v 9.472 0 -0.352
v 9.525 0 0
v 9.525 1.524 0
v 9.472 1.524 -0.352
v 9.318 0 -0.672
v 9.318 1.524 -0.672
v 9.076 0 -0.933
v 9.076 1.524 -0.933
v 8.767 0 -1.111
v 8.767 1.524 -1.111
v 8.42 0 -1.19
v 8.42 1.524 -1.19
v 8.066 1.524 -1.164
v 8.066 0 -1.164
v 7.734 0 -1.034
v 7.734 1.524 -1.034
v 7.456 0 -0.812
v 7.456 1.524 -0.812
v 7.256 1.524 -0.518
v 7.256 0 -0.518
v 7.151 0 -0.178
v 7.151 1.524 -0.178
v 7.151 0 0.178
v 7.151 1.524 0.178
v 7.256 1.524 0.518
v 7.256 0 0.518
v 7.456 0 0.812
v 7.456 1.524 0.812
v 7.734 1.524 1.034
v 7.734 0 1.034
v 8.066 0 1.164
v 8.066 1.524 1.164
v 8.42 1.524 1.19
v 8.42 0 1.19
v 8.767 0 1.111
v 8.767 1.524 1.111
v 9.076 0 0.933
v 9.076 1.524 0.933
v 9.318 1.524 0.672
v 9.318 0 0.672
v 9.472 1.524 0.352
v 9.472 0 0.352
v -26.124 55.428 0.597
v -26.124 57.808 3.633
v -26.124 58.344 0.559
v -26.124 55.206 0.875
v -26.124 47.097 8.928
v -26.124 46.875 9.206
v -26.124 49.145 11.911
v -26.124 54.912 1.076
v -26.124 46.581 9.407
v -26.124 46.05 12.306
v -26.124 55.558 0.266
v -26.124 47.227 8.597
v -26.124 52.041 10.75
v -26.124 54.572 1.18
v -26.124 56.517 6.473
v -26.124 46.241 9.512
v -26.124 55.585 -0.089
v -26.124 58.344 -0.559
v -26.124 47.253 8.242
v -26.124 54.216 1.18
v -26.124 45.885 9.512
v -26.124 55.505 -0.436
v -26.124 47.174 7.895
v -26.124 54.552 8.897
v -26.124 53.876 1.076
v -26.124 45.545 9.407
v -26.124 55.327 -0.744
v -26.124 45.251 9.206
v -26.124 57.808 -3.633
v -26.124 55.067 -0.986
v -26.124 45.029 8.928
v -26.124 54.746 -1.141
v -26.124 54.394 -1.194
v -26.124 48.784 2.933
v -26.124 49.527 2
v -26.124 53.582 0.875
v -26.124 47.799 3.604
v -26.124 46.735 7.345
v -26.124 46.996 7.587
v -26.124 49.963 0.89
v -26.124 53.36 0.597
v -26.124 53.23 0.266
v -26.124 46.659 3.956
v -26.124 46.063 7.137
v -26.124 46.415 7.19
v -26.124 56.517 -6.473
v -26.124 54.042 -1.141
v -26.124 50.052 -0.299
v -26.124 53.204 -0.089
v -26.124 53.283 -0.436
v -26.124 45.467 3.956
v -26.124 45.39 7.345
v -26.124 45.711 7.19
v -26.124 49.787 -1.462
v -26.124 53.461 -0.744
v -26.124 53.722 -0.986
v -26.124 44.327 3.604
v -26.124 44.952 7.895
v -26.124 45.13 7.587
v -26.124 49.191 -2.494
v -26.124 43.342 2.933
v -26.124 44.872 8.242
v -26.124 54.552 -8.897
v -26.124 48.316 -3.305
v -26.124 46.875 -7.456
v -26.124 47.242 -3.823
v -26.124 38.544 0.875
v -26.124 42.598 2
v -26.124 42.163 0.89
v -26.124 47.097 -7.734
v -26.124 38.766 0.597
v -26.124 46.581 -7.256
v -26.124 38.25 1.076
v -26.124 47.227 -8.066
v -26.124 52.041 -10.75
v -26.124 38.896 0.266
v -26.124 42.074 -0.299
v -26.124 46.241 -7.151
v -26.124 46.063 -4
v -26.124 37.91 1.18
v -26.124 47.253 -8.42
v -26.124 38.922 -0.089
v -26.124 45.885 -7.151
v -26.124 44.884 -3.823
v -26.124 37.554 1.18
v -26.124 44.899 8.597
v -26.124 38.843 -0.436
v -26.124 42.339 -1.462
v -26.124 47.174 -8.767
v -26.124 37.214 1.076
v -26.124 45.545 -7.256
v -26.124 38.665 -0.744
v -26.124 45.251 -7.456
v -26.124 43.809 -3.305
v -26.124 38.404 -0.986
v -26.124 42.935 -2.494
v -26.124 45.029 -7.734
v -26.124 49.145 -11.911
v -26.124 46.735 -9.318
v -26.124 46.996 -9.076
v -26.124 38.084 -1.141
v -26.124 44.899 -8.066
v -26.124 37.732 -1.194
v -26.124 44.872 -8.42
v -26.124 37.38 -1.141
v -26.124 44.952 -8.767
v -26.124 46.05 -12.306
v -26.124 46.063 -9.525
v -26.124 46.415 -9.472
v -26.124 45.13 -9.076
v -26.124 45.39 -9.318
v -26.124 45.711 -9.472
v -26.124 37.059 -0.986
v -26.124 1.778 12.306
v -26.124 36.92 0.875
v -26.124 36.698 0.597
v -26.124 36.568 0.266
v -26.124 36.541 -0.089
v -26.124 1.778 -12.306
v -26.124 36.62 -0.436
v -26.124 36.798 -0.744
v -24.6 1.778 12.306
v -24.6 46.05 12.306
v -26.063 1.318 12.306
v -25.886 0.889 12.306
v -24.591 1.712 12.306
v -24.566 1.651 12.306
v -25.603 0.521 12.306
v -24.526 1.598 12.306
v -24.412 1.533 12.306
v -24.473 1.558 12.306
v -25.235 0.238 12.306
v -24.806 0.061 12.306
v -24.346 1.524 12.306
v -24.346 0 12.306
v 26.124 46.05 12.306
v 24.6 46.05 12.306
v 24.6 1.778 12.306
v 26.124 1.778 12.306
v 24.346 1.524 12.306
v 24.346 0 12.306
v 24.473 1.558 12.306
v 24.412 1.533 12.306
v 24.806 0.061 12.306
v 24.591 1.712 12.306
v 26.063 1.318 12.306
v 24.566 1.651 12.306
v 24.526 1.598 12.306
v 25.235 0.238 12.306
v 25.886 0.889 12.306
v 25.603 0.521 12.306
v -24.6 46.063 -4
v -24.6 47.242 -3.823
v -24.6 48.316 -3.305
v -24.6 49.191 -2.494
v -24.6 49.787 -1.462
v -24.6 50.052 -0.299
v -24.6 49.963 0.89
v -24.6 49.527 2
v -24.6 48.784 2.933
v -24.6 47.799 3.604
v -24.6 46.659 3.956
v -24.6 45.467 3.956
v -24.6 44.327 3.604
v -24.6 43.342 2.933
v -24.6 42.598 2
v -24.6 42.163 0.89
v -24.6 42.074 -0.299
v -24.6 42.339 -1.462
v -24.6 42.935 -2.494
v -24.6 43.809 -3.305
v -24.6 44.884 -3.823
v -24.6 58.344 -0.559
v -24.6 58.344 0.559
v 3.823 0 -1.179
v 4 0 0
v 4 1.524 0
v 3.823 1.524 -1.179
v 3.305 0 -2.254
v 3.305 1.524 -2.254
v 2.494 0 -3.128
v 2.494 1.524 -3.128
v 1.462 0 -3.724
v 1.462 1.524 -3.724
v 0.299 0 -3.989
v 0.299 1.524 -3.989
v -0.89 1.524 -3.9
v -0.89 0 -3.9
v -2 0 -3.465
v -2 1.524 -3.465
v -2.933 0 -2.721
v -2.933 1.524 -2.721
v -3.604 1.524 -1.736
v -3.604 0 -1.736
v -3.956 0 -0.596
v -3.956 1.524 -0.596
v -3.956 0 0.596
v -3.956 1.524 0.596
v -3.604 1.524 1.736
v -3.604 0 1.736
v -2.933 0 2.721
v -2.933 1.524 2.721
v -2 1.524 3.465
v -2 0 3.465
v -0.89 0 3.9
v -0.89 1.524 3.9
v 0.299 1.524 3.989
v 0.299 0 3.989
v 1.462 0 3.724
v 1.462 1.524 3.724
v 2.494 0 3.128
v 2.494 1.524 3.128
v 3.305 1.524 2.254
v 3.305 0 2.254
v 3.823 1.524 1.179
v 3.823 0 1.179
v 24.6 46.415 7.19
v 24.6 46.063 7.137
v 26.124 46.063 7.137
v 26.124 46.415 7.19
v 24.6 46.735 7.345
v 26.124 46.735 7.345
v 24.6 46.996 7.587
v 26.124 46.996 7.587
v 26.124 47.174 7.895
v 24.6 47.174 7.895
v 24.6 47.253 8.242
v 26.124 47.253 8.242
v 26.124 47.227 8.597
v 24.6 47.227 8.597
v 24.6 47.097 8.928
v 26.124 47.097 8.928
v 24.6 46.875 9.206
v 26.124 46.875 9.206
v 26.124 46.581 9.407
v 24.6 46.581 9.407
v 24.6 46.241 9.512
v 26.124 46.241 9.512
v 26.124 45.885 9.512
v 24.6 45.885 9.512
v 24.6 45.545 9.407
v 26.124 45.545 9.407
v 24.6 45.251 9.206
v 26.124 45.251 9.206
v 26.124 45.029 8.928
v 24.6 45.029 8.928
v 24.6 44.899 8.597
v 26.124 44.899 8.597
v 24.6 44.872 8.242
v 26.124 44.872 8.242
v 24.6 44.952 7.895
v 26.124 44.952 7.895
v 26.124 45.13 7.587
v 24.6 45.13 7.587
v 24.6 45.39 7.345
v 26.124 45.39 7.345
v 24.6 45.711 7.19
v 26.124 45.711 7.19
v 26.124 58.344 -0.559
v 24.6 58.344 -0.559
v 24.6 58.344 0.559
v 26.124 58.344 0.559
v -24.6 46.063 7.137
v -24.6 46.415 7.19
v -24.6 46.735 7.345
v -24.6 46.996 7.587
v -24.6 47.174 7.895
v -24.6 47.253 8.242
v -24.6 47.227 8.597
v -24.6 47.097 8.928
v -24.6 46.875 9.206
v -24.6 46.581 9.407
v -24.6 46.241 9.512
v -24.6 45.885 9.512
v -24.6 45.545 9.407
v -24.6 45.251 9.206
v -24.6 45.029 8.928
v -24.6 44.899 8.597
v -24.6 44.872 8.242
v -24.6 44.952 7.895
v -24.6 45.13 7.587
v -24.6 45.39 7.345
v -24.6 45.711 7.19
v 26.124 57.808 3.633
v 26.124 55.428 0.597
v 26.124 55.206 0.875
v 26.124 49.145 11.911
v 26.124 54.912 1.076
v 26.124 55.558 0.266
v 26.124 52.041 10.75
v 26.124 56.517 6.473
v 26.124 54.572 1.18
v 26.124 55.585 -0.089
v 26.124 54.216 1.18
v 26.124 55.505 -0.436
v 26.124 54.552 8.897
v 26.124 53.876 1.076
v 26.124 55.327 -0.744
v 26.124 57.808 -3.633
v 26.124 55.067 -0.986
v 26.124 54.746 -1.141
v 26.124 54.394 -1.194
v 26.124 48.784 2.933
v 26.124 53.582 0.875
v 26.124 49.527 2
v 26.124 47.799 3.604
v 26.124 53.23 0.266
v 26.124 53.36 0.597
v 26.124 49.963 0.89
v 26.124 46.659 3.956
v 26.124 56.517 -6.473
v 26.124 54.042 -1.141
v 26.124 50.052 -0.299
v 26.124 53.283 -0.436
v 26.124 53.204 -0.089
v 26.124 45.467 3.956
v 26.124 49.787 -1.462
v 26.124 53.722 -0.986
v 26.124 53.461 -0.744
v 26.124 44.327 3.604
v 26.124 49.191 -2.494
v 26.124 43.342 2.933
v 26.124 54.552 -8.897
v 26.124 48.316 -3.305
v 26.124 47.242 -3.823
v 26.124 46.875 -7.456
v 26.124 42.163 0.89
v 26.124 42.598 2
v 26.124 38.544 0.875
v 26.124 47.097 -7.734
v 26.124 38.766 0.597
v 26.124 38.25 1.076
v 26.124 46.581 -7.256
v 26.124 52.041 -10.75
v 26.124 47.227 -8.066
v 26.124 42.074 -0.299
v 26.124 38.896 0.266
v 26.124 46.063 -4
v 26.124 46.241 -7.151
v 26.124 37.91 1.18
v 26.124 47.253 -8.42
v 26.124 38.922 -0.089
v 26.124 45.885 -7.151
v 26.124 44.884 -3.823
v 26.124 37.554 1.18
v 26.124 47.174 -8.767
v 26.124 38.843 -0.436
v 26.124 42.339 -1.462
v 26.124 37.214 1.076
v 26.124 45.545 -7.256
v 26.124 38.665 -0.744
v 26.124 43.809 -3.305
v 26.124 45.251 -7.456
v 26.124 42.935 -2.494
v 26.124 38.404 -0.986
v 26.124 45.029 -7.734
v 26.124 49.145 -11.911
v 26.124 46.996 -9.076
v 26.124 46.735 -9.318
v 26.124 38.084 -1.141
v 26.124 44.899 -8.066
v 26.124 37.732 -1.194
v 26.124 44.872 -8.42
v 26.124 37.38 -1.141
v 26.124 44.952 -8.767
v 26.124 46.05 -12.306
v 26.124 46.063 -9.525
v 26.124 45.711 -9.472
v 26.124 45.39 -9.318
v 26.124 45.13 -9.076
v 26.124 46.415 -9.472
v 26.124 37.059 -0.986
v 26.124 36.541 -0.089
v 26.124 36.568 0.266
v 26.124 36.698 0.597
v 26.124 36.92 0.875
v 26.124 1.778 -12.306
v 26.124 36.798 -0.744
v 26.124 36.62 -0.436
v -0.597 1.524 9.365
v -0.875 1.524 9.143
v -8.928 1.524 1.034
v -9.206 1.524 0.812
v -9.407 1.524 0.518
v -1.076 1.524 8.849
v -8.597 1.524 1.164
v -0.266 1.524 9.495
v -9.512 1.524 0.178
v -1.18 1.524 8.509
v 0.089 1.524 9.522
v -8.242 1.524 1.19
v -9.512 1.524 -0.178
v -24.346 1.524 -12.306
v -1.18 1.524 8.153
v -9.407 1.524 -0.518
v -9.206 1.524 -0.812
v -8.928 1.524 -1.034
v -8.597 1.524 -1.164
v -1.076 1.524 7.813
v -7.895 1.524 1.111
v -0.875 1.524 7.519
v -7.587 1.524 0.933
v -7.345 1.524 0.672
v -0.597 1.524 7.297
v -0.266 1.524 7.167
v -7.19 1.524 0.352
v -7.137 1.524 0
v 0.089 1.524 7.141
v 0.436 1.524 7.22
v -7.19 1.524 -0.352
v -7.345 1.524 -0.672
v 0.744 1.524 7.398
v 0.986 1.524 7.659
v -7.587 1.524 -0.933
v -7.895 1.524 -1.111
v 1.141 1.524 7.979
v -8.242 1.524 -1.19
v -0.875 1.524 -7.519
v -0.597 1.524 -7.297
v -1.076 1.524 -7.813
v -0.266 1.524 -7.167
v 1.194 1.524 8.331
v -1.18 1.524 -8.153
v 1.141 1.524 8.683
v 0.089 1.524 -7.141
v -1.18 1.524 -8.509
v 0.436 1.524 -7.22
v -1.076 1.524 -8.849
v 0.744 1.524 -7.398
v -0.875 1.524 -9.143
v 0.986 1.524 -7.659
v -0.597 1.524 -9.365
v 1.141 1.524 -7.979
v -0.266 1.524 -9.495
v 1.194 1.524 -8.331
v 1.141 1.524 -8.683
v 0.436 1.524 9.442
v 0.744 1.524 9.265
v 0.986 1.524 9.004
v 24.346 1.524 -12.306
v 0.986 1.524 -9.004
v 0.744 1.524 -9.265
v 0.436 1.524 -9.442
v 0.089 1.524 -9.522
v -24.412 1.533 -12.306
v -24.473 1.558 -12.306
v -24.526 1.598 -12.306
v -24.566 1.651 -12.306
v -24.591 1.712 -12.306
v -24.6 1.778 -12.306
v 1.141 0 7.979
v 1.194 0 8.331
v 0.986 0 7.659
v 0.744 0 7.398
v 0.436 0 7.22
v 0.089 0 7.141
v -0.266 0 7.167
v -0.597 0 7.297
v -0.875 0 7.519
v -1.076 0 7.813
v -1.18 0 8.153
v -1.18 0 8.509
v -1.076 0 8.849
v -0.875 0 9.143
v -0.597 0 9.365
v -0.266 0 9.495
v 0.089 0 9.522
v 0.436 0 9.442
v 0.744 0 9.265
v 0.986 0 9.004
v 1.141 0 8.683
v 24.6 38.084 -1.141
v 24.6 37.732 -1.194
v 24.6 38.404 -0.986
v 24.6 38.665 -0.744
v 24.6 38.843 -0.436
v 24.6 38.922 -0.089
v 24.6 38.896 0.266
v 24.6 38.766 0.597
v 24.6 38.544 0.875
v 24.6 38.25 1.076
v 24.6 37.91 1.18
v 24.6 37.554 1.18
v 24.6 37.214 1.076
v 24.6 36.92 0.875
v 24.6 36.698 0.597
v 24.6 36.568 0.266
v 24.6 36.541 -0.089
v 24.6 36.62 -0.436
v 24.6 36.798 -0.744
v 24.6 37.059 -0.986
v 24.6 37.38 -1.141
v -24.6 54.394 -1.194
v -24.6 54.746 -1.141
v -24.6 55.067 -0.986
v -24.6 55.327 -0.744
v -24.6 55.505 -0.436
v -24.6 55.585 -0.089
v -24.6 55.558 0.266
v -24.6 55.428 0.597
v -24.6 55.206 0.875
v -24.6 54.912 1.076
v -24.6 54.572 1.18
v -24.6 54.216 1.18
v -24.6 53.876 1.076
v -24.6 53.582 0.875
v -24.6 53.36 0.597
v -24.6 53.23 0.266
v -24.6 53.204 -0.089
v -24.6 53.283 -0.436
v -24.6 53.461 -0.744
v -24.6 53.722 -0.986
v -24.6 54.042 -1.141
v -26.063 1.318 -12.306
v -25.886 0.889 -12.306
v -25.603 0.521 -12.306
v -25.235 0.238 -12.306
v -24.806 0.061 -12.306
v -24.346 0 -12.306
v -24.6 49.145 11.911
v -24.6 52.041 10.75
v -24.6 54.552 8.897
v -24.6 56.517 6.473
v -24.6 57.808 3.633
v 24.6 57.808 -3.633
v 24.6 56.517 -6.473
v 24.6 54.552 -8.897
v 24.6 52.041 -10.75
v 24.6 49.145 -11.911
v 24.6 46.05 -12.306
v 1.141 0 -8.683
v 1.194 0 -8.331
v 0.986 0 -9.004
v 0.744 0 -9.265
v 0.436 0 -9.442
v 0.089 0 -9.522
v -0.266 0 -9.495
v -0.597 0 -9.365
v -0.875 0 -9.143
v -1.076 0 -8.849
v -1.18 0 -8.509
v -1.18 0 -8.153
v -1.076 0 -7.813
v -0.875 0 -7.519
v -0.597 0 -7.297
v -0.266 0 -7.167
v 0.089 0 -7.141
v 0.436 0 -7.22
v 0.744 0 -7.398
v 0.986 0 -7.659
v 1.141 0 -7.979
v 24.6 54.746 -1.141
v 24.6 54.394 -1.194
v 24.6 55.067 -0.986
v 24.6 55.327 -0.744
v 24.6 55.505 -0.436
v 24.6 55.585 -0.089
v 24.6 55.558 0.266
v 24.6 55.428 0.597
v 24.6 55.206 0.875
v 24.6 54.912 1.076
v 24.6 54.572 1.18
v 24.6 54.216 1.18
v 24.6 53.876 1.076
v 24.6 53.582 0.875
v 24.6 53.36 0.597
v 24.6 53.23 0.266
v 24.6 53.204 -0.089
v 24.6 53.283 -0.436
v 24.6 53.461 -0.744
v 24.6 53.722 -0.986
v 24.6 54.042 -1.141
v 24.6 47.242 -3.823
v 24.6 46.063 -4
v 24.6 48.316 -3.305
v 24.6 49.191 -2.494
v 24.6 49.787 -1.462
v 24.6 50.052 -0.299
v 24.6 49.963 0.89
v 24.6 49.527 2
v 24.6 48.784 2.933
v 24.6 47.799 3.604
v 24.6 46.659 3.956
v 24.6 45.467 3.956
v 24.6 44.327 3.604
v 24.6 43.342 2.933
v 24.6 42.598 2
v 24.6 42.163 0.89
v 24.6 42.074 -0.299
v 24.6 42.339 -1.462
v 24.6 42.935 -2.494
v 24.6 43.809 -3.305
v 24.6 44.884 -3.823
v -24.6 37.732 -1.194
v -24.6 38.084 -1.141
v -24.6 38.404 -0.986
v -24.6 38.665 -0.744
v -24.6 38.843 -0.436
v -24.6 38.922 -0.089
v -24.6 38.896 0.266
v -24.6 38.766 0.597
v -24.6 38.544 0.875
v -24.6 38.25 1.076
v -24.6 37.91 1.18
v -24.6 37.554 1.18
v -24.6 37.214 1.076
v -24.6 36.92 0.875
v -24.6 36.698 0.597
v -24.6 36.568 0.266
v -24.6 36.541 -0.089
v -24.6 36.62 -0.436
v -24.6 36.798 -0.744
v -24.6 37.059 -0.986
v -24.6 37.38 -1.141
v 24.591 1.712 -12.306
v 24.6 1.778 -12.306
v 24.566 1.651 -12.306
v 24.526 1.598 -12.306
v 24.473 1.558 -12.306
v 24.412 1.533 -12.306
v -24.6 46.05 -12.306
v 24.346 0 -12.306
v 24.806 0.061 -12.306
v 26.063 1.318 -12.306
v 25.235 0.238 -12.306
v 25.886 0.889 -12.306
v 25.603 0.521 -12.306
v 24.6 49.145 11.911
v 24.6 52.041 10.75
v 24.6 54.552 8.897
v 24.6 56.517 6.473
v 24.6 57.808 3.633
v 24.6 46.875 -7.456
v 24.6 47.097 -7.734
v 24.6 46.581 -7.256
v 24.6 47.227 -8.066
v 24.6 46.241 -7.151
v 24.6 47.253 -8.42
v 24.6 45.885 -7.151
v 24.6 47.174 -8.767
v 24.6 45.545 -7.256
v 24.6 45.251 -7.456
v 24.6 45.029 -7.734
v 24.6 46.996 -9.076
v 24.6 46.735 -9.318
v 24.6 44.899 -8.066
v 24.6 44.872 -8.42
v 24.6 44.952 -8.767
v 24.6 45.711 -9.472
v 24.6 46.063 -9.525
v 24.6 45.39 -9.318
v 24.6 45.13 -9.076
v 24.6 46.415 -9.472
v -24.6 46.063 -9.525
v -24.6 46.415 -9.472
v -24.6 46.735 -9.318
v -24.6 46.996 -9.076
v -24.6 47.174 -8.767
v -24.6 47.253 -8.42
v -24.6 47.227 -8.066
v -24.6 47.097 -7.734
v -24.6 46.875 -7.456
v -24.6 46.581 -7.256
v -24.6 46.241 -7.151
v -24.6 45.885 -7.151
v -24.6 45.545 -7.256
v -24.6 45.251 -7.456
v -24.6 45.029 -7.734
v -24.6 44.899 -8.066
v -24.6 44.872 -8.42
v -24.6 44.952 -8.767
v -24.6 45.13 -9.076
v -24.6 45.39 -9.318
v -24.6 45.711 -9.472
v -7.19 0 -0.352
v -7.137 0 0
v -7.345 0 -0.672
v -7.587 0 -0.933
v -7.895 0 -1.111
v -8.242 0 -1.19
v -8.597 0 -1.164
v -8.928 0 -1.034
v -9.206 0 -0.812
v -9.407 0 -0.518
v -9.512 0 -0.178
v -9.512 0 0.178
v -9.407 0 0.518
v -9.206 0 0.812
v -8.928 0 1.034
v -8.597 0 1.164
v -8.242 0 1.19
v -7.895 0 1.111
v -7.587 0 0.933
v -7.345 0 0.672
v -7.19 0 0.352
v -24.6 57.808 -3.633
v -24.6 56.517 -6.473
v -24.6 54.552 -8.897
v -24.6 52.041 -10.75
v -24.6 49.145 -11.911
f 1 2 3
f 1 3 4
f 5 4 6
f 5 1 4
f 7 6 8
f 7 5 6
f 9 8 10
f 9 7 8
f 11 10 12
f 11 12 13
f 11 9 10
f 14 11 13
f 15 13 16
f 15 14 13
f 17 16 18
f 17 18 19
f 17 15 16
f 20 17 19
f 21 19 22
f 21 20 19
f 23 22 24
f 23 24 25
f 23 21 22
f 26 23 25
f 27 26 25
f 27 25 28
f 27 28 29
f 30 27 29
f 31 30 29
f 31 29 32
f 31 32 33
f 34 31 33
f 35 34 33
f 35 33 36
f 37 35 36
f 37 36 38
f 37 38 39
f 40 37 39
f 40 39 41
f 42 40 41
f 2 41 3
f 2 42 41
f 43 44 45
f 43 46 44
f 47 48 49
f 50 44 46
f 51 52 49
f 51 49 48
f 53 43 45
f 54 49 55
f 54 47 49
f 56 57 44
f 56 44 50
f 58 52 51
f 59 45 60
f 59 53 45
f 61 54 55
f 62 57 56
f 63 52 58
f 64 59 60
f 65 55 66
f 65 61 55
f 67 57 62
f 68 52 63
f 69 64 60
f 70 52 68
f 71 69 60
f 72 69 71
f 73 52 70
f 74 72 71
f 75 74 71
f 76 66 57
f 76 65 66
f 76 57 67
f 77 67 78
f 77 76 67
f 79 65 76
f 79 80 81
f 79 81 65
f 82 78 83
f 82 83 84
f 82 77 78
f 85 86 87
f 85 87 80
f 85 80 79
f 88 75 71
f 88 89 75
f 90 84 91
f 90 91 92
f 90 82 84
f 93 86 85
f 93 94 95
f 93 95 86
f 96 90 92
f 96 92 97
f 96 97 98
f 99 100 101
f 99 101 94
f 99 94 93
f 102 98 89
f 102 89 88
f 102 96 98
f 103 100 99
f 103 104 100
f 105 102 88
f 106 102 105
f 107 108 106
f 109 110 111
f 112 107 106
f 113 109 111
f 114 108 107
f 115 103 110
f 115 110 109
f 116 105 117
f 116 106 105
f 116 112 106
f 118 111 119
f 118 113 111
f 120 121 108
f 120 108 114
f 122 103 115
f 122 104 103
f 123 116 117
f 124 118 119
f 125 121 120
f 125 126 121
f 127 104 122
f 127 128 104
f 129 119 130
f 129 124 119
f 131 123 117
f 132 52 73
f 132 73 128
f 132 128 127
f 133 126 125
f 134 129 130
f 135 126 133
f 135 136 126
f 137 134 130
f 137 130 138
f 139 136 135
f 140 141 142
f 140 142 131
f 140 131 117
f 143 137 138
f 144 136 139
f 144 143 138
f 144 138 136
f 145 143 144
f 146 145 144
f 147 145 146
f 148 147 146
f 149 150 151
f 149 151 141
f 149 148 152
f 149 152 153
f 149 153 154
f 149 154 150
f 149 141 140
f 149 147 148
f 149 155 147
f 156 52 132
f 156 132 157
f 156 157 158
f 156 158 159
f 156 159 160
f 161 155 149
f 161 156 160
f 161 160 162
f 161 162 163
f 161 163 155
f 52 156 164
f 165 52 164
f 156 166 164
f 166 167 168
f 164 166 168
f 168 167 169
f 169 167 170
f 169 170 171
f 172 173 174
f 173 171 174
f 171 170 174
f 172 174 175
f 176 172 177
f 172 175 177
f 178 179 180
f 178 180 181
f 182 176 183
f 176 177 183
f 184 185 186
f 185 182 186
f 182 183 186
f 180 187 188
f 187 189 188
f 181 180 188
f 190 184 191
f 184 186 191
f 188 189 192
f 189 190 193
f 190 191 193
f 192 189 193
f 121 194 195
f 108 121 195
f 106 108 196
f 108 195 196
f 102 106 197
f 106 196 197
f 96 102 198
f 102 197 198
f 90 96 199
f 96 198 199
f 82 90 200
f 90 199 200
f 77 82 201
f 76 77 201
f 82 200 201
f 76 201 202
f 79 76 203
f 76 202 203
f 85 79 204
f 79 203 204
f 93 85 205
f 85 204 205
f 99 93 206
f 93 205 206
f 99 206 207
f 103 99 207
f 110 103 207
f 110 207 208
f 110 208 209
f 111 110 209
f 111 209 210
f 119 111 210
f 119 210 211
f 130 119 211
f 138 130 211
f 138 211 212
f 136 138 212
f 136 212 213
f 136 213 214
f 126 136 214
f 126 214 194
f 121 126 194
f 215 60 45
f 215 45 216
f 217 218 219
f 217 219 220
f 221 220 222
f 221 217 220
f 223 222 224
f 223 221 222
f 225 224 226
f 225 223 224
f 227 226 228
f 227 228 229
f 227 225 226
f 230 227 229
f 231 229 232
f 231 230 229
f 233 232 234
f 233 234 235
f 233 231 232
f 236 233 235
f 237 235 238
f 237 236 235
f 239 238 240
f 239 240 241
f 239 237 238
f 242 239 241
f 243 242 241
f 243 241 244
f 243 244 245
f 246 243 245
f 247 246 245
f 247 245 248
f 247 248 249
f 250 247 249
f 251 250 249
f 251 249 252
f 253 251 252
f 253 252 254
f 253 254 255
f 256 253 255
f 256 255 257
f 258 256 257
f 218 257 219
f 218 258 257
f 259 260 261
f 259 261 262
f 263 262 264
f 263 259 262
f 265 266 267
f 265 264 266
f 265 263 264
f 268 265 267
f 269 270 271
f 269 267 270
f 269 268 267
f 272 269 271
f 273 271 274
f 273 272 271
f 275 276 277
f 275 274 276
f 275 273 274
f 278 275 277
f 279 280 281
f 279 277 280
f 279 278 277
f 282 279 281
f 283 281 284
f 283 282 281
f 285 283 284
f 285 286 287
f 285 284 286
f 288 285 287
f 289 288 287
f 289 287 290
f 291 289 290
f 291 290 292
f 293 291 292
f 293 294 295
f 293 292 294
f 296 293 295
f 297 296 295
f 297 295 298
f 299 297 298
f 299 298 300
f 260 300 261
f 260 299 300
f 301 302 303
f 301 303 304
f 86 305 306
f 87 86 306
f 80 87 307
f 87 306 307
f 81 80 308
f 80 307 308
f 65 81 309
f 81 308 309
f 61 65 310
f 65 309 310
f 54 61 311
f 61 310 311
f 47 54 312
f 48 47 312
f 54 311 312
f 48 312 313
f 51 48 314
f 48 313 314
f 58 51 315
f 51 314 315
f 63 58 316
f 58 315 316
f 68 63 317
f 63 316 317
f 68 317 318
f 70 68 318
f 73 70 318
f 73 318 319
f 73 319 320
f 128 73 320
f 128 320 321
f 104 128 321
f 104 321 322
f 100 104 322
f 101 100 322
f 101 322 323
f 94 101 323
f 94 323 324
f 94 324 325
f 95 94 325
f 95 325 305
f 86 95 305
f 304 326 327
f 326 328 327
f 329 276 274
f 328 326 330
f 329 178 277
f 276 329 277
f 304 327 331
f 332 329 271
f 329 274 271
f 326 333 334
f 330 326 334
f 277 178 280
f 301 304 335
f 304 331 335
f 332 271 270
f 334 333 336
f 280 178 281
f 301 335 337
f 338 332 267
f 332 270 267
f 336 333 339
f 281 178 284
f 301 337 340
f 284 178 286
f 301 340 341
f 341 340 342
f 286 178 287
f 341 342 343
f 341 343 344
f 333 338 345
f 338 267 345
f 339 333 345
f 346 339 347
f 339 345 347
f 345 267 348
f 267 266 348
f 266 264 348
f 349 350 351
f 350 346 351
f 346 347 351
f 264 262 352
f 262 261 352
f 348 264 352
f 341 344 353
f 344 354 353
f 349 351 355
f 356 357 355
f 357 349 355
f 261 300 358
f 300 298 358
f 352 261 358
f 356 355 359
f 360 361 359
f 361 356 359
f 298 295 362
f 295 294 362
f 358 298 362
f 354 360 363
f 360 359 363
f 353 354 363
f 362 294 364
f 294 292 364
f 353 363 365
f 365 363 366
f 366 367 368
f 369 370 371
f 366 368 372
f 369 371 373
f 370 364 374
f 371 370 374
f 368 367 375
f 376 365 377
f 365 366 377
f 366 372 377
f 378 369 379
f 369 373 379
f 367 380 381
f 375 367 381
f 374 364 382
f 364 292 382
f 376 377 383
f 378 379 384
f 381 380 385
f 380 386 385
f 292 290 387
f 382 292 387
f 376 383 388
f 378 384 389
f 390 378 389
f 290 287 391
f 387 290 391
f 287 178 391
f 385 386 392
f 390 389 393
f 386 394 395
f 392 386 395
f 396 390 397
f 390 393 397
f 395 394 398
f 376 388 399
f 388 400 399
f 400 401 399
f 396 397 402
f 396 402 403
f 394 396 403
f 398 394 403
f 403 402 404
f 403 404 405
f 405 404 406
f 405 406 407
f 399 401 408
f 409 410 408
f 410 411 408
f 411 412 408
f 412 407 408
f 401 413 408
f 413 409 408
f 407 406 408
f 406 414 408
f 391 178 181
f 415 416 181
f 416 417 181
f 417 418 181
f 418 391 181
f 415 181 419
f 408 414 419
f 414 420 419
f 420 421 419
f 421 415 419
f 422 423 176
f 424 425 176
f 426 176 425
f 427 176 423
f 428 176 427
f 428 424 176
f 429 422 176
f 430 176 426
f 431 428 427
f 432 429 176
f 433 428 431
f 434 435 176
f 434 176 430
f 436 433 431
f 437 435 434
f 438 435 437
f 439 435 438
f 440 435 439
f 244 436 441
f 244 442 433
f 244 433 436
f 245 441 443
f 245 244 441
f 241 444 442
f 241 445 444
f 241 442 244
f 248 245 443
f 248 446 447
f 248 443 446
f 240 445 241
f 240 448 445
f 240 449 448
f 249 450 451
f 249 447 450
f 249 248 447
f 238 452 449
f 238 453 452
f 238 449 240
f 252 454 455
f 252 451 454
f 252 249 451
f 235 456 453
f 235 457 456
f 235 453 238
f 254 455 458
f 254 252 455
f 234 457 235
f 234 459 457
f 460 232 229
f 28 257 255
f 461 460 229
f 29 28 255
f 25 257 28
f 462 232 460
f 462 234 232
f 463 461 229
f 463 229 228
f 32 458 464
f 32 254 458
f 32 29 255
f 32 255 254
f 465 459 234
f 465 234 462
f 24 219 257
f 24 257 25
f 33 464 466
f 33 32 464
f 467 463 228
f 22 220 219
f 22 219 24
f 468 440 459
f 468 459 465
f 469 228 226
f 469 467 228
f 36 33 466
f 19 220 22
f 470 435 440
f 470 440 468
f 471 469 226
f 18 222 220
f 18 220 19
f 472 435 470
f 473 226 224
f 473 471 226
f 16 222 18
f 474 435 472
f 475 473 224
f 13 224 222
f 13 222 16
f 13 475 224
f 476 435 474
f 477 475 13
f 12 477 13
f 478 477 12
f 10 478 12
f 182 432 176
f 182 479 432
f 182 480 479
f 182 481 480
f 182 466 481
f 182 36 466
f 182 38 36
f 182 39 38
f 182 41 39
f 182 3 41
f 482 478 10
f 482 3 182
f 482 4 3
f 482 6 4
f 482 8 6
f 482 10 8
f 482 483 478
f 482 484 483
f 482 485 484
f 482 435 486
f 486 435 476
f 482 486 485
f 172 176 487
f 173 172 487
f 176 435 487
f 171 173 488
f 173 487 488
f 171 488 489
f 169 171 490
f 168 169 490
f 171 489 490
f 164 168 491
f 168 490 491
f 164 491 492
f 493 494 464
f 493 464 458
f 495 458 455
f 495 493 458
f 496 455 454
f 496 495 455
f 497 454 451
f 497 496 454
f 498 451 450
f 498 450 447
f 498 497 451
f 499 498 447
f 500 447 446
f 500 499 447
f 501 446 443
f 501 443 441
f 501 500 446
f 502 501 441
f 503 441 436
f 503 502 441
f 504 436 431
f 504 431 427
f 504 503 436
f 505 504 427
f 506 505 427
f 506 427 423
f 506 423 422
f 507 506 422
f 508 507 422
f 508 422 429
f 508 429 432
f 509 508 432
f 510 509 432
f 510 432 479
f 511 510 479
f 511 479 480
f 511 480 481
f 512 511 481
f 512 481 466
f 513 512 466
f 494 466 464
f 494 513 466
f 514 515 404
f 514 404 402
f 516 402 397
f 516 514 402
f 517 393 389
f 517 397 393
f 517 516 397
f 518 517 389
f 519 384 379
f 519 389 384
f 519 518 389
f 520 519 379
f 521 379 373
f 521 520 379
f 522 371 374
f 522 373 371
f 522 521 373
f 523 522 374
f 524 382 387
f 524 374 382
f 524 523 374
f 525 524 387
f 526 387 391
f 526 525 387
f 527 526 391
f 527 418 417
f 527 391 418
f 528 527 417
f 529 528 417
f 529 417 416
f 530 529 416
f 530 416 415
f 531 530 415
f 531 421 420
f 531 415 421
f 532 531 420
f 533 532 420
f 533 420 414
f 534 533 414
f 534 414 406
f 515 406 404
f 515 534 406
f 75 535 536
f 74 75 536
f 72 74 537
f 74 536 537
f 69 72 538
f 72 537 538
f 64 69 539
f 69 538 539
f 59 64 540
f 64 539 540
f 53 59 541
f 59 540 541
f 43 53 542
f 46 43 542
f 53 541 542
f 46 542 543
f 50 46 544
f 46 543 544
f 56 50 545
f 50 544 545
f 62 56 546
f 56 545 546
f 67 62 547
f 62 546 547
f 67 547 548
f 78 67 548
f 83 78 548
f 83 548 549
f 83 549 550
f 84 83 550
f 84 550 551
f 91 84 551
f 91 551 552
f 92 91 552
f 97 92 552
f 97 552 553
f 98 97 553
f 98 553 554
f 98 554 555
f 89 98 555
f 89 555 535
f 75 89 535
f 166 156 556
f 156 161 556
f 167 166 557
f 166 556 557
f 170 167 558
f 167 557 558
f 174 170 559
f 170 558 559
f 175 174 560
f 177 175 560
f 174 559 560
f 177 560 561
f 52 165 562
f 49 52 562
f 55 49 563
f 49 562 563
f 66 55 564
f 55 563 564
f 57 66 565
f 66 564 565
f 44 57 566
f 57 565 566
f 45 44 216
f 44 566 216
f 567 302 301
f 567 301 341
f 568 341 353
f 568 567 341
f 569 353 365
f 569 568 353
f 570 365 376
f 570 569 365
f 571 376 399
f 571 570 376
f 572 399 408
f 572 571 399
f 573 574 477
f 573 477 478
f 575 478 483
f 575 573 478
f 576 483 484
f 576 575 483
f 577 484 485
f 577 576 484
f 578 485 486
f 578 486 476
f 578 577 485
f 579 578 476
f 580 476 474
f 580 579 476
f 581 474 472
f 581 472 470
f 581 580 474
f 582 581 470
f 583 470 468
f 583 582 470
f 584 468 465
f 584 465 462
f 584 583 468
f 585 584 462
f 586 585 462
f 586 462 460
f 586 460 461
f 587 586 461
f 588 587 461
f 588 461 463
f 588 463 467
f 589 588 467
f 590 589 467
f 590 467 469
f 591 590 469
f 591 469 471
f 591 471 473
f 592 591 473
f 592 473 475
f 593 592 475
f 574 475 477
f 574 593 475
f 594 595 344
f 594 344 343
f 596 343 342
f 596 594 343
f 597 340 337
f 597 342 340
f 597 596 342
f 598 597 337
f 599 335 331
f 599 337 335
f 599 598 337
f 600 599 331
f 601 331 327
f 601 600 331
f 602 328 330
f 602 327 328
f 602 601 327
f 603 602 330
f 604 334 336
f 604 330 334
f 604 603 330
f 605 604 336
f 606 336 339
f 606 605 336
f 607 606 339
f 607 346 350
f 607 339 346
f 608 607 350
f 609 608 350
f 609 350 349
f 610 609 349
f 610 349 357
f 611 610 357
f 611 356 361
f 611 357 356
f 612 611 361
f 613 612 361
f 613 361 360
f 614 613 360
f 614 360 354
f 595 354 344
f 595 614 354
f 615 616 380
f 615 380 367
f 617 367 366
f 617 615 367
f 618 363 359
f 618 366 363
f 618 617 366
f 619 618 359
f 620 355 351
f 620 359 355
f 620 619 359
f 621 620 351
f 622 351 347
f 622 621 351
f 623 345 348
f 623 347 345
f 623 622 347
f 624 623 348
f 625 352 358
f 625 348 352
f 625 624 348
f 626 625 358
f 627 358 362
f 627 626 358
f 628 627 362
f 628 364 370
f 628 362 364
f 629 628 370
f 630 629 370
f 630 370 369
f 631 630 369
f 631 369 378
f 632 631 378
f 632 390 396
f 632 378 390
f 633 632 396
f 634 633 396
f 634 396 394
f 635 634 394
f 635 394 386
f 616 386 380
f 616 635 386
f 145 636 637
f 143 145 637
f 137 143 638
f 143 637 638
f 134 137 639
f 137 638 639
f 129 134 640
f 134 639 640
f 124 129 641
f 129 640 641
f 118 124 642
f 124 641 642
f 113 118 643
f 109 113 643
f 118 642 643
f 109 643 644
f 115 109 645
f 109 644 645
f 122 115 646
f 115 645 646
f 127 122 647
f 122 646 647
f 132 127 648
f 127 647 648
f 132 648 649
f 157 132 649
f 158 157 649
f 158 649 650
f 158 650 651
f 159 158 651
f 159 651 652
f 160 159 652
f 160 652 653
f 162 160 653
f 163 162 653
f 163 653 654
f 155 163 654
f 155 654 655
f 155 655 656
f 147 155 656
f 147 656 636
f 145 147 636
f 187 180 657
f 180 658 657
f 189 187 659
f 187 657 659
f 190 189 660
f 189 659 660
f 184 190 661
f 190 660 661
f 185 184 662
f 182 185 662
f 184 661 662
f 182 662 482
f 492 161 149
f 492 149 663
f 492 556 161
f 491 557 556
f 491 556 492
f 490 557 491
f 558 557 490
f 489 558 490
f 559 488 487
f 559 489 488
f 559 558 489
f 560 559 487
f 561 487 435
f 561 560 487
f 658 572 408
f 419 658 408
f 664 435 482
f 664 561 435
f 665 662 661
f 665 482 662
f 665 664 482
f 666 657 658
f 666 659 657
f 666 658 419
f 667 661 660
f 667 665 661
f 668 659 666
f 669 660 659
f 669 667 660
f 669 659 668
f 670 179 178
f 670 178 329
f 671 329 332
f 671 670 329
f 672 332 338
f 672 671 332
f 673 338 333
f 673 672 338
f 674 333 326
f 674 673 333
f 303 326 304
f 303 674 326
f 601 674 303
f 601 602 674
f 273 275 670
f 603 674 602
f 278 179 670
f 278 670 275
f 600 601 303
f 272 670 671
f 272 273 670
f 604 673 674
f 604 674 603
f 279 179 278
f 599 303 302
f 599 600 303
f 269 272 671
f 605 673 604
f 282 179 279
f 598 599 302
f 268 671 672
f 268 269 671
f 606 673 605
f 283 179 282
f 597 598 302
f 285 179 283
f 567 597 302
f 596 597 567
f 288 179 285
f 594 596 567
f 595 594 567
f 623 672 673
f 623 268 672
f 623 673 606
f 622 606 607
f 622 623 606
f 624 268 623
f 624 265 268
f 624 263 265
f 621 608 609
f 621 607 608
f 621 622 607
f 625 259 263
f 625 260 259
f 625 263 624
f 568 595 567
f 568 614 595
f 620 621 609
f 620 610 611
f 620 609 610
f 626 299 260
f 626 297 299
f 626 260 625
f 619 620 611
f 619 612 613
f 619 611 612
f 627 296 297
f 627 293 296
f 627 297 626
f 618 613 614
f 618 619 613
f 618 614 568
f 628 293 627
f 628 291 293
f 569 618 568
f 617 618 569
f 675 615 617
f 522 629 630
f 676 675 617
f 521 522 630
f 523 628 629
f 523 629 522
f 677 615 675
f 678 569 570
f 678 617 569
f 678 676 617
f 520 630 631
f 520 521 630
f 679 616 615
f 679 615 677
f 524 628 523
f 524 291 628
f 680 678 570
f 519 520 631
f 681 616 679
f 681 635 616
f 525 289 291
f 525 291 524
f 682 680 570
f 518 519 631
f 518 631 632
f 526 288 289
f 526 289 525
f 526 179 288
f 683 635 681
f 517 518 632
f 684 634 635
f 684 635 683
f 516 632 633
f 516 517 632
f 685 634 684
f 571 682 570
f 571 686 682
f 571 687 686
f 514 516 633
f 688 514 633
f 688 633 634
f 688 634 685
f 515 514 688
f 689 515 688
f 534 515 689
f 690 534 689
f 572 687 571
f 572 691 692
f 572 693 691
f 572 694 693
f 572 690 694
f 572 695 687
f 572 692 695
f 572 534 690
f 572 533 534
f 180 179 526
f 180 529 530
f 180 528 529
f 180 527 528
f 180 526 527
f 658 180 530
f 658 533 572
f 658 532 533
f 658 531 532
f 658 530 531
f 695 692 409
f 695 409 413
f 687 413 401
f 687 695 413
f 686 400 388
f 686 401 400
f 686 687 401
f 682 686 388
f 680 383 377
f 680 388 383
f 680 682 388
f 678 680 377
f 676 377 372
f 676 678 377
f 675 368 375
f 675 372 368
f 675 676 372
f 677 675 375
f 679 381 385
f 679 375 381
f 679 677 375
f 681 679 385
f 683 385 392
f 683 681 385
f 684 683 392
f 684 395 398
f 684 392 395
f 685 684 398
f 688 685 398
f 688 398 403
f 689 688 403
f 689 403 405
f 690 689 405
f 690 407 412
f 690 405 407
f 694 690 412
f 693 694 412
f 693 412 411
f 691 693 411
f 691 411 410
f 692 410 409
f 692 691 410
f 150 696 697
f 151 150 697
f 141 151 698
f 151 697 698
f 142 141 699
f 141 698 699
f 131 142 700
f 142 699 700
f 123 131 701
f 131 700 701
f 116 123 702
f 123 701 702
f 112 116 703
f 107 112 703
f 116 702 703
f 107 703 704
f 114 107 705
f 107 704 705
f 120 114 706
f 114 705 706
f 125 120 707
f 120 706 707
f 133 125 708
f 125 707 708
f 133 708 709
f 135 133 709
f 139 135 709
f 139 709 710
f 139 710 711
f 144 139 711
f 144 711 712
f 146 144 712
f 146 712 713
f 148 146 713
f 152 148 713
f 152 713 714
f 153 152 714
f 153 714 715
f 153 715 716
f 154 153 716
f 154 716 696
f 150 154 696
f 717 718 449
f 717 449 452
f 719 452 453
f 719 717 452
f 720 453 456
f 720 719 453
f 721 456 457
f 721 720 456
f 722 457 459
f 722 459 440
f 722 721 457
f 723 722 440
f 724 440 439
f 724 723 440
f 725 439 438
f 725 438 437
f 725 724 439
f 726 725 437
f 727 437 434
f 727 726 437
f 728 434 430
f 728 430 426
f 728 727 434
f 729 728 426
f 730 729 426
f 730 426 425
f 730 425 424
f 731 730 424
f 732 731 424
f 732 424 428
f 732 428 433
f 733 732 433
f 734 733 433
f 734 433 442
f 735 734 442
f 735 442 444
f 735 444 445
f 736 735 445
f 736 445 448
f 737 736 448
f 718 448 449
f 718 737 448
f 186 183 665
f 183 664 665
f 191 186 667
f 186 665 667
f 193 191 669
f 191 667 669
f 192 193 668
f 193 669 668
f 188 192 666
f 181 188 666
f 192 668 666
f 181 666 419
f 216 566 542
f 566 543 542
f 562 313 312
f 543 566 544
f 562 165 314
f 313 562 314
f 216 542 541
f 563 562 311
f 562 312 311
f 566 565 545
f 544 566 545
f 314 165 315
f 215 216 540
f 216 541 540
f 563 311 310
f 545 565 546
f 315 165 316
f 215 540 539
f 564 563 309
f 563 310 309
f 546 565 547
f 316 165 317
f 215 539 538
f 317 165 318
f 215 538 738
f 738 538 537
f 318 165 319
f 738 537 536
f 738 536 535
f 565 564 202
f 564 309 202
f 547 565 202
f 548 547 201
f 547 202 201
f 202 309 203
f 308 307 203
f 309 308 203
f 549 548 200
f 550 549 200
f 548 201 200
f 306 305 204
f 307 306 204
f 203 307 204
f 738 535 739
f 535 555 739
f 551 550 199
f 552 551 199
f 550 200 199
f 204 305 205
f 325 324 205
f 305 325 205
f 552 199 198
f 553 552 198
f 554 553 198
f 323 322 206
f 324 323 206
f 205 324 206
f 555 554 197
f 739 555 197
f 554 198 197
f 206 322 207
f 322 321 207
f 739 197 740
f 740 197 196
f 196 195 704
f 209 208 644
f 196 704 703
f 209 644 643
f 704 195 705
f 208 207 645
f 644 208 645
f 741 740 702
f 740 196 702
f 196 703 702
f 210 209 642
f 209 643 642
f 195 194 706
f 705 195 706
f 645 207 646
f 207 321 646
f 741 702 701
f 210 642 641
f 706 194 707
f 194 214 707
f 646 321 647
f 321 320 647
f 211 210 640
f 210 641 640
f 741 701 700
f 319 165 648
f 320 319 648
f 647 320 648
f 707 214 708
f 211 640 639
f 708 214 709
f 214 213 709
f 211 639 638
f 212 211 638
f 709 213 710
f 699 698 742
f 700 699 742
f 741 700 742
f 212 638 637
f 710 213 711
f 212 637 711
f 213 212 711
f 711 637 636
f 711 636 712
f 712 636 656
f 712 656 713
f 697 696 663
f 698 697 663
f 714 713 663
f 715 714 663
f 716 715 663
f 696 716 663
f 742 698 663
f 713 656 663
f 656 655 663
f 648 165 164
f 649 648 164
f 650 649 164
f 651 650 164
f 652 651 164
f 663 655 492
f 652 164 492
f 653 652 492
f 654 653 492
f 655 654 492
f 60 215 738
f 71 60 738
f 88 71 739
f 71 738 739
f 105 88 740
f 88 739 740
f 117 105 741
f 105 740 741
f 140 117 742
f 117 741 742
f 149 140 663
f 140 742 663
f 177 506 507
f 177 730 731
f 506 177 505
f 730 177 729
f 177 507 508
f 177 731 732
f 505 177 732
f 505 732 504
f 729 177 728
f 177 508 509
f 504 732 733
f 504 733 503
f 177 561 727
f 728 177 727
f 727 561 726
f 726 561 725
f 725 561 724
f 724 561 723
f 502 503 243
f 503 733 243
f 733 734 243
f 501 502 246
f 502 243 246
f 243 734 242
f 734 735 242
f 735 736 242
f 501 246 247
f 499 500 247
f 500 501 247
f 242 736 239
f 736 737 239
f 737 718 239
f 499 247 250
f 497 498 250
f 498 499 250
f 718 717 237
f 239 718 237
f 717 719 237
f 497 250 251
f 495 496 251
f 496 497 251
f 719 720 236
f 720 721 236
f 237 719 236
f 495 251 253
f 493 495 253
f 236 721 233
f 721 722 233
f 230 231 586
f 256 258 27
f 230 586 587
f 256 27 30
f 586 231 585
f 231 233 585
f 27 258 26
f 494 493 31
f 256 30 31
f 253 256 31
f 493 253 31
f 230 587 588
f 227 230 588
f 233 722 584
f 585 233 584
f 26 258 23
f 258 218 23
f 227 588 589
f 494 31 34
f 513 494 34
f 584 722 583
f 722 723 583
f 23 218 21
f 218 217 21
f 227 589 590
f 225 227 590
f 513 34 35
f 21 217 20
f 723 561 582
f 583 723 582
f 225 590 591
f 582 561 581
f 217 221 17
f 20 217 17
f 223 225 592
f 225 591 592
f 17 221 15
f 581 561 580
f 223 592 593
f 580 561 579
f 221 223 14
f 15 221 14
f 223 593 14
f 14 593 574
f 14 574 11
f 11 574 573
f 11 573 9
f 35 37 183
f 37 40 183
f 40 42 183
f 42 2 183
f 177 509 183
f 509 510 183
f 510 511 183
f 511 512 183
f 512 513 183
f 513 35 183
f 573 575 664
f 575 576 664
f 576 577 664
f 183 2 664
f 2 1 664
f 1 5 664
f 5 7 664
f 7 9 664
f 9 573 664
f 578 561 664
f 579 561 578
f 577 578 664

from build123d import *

# Parameters (mm, degrees)
SKETCH1_W               = 49.1998
SKETCH1_H               = 24.6126
SKETCH1_R               = 1.1938
SKETCH1_R_2             = 4.0005
EXTRUDE1_DEPTH          = 1.524
SKETCH1_3_W             = 1.524
SKETCH1_3_H             = 24.6126
EXTRUDE2_DEPTH          = 58.3438
SKETCH4_R               = 4.0005
SKETCH4_R_2             = 1.1938
CUT_EXTRUDE1_DEPTH      = 40.8686
CUT_EXTRUDE1_DEPTH_BACK = 40.8686
FILLET1_R               = 0.254
FILLET2_R               = 1.778


with BuildPart() as part:
    # Sketch1 → Extrude1 (new body)
    with BuildSketch(Plane(origin=(0, 0, 0), x_dir=(1, 0, 0), z_dir=(0, 1, 0))):
        Rectangle(SKETCH1_W, SKETCH1_H)
        with Locations((-8.3312, 0)):
            Circle(SKETCH1_R, mode=Mode.SUBTRACT)
        with Locations((0, -8.3312)):
            Circle(SKETCH1_R, mode=Mode.SUBTRACT)
        Circle(SKETCH1_R_2, mode=Mode.SUBTRACT)
        with Locations((8.3312, 0)):
            Circle(SKETCH1_R, mode=Mode.SUBTRACT)
        with Locations((0, 8.3312)):
            Circle(SKETCH1_R, mode=Mode.SUBTRACT)
    extrude(amount=EXTRUDE1_DEPTH)

    # Sketch1<3> → Extrude2 (add)
    with BuildSketch(Plane(origin=(0, 0, 0), x_dir=(1, 0, 0), z_dir=(0, 1, 0))):
        with Locations((25.3619, 0)):
            Rectangle(SKETCH1_3_W, SKETCH1_3_H)
        with Locations((-25.3619, 0)):
            Rectangle(SKETCH1_3_W, SKETCH1_3_H)
    extrude(amount=EXTRUDE2_DEPTH)

    # Sketch4 → Cut-Extrude1 (cut, two sides)
    with BuildSketch(Plane(origin=(0, 0, 0), x_dir=(0, 0, -1), z_dir=(1, 0, 0))) as cut_extrude1_sk:
        with BuildLine():
            Line((-0.5589443, 58.3438), (-12.3063, 58.3438))
            Line((-12.3063, 58.3438), (-12.3063, 46.0502))
            ThreePointArc((-12.3063, 46.0502), (-8.897290484, 54.552155171), (-0.5589443, 58.3438))
        make_face()
        with BuildLine():
            Line((12.3063, 58.3438), (0.5589443, 58.3438))
            ThreePointArc((0.5589443, 58.3438), (8.897290484, 54.552155171), (12.3063, 46.0502))
            Line((12.3063, 46.0502), (12.3063, 58.3438))
        make_face()
        with Locations((0, 46.0629)):
            Circle(SKETCH4_R)
        with Locations((8.3312, 46.0629)):
            Circle(SKETCH4_R_2)
        with Locations((0, 54.3941)):
            Circle(SKETCH4_R_2)
        with Locations((-8.3312, 46.0629)):
            Circle(SKETCH4_R_2)
        with Locations((0, 37.7317)):
            Circle(SKETCH4_R_2)
    extrude(amount=CUT_EXTRUDE1_DEPTH, mode=Mode.SUBTRACT)
    extrude(cut_extrude1_sk.sketch, amount=-CUT_EXTRUDE1_DEPTH_BACK, mode=Mode.SUBTRACT)

    # Fillet1
    fillet1_edges = [part.edges().sort_by_distance(p)[0] for p in [
        (-24.5999, 1.524, 0),
        (24.5999, 1.524, 0),
    ]]
    fillet(fillet1_edges, radius=FILLET1_R)

    # Fillet2
    fillet2_edges = [part.edges().sort_by_distance(p)[0] for p in [
        (-26.1239, 0, 0),
        (26.1239, 0, 0),
    ]]
    fillet(fillet2_edges, radius=FILLET2_R)


solid = part.part
